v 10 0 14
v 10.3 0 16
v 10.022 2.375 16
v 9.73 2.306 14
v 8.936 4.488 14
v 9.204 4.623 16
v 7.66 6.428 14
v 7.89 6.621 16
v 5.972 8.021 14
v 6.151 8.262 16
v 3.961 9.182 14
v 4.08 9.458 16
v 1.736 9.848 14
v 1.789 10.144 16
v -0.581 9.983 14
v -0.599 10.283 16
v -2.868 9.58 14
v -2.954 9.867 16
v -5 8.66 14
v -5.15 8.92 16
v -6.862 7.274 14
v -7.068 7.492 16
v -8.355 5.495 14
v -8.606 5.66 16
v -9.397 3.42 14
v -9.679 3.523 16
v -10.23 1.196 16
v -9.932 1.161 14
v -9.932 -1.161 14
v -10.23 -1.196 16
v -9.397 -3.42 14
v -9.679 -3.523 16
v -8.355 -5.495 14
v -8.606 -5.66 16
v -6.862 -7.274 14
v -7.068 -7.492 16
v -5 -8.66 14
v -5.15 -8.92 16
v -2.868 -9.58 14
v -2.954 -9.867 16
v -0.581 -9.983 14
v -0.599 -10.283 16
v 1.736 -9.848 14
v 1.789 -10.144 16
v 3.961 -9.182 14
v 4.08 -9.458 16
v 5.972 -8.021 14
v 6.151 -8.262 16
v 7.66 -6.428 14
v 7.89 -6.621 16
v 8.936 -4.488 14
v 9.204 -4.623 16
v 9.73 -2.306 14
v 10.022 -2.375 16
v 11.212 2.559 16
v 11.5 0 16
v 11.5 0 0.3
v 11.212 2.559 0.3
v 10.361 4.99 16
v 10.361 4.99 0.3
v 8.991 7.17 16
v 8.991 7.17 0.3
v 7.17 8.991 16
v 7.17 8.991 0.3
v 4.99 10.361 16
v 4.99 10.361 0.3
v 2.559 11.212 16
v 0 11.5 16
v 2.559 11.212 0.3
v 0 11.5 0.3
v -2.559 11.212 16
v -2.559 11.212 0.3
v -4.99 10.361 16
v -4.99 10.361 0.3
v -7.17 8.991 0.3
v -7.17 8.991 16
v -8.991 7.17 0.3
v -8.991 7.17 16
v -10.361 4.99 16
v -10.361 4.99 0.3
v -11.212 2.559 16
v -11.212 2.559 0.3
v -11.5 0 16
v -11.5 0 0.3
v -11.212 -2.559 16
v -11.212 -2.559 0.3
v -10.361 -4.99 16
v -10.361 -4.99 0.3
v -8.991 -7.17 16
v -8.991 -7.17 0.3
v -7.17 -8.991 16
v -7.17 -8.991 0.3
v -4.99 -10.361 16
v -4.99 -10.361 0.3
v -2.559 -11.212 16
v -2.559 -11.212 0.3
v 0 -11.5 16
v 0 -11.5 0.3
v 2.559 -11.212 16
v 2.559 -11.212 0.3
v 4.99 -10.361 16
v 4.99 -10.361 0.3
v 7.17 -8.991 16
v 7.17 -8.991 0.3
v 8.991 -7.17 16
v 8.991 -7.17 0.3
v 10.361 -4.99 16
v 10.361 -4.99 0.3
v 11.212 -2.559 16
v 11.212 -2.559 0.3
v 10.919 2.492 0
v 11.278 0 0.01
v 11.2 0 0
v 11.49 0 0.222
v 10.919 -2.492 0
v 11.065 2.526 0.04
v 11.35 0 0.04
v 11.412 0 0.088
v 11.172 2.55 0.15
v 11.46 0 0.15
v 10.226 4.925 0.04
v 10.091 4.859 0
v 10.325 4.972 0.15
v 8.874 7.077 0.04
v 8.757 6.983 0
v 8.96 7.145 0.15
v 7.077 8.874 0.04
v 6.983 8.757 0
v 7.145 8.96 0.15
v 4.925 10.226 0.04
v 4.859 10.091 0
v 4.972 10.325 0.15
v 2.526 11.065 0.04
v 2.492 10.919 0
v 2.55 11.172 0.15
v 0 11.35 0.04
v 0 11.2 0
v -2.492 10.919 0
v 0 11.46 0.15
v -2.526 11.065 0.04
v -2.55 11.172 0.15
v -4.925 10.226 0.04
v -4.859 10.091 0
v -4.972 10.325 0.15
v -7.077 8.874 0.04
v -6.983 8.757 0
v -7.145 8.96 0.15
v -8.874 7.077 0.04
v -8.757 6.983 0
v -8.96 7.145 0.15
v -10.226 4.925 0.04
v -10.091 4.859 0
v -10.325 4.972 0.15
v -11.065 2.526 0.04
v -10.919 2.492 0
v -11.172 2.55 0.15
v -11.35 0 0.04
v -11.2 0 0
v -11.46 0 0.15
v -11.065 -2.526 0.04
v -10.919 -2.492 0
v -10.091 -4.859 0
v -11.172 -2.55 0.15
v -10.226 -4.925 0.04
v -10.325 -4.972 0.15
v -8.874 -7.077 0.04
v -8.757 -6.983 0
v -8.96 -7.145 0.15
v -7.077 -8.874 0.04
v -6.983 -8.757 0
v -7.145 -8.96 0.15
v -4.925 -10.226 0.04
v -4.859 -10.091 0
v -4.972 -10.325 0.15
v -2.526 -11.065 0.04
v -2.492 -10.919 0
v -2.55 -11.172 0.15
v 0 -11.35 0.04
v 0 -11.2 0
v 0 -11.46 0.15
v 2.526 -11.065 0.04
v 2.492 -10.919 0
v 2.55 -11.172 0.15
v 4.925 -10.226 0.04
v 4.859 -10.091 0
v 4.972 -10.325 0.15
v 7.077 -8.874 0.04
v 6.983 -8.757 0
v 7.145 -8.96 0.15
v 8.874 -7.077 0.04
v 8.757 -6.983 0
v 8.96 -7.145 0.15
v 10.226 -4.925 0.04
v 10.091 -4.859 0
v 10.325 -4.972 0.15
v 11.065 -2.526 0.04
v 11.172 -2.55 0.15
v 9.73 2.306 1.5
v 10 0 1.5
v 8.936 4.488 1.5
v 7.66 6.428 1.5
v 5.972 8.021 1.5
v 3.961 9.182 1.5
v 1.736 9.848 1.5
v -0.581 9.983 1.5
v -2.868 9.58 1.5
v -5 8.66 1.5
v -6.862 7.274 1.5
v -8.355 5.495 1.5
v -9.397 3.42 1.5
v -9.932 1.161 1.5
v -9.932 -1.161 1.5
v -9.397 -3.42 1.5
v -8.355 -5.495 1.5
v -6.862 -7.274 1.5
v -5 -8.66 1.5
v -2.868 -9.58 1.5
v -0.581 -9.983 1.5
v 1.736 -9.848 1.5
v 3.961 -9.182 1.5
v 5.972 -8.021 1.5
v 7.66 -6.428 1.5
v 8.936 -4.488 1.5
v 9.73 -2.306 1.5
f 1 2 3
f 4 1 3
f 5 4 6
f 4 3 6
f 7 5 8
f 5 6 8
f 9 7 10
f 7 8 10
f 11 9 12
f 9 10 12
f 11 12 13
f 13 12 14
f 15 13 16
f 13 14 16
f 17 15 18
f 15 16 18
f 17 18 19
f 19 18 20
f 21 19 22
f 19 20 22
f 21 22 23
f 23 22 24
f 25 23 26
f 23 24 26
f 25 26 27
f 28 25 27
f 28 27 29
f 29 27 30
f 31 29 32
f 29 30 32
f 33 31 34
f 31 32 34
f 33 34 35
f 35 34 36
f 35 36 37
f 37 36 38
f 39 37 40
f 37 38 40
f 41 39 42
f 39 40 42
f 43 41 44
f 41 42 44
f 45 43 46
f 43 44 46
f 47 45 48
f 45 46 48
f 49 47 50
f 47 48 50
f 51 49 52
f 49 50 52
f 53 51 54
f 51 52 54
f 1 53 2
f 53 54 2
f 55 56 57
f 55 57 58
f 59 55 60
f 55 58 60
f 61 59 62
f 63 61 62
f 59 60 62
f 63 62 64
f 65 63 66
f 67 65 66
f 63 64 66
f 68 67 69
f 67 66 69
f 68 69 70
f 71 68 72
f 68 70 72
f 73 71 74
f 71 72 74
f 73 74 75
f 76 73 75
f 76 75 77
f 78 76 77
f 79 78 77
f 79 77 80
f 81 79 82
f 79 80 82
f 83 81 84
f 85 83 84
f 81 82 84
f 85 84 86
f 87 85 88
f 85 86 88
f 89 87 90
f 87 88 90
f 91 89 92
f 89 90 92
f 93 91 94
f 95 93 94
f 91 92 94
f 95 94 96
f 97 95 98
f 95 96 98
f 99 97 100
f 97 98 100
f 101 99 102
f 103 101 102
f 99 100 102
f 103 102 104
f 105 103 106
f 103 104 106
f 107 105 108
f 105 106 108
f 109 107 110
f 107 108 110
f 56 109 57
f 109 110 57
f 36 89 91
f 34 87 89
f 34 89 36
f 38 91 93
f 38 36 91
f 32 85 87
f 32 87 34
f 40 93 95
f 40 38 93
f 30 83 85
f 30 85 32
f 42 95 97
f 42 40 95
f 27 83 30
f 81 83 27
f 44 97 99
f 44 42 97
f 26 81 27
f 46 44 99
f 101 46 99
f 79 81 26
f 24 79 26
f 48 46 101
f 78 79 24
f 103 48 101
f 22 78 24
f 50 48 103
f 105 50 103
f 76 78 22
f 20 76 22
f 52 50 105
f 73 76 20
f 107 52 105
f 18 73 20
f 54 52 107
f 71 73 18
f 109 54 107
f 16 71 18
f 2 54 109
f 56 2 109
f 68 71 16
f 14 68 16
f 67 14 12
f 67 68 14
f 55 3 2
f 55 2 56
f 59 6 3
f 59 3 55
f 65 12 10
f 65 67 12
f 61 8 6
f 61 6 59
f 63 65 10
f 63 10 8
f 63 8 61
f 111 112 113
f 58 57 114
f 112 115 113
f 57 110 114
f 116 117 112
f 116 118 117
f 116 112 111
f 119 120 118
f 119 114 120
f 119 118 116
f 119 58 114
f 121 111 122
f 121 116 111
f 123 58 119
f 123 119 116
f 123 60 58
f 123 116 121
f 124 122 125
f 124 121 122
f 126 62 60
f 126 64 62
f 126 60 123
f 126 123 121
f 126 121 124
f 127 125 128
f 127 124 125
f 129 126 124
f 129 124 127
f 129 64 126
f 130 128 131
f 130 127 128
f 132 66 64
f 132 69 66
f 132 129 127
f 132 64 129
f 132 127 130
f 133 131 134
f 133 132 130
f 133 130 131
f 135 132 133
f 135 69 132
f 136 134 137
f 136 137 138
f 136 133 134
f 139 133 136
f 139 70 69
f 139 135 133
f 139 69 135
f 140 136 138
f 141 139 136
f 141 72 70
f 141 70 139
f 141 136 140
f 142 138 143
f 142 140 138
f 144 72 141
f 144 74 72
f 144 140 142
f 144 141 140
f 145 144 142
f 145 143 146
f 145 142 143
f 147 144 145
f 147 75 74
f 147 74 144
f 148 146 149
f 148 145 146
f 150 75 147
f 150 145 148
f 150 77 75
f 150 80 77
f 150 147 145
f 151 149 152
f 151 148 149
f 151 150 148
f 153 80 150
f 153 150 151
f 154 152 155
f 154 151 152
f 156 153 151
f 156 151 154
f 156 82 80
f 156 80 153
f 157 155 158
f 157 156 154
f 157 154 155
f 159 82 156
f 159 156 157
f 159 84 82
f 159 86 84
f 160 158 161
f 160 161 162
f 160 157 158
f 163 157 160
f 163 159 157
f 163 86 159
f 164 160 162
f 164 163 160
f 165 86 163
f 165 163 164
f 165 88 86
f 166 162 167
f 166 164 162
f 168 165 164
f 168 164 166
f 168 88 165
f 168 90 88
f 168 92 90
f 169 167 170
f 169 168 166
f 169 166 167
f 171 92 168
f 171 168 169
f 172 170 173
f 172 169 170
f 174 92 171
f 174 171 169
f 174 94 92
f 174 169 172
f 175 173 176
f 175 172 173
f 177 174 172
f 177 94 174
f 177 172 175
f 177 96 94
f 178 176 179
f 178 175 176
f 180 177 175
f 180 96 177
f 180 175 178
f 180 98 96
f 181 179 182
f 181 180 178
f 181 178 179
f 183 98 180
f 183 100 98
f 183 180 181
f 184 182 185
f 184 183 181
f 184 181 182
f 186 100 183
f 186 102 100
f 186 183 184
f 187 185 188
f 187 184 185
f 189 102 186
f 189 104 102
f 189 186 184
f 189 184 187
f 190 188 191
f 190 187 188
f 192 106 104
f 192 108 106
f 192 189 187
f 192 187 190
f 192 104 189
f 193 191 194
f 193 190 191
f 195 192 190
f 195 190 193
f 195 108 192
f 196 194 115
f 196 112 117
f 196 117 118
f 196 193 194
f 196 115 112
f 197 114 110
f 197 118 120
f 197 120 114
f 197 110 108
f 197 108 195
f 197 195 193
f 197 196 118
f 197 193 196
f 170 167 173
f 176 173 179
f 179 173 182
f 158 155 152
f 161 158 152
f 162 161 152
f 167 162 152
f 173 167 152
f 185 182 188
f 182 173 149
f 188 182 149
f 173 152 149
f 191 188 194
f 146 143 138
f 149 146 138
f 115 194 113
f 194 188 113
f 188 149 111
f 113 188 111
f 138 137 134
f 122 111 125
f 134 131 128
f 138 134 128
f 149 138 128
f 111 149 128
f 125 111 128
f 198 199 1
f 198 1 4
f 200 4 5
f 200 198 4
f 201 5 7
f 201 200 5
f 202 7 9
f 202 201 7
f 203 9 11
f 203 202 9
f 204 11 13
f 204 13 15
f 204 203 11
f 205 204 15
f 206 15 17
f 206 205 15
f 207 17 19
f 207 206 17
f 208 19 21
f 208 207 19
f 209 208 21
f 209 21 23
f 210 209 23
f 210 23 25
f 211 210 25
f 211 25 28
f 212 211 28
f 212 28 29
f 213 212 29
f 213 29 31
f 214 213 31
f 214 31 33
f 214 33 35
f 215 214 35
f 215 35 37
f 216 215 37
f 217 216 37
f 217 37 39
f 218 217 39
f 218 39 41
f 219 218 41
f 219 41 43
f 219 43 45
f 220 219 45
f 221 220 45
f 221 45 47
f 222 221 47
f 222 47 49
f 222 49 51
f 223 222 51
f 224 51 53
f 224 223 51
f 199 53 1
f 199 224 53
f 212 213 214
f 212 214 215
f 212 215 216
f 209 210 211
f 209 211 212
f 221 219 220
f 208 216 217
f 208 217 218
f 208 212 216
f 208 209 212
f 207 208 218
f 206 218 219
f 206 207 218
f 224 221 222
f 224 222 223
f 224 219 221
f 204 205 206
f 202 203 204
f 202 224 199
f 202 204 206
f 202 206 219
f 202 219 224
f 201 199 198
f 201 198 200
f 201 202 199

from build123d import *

# Parameters (mm, degrees)
F2_R     = 11.5
F2_R_2   = 10
F3_DEPTH = 16
F4_DEPTH = 1.5
F5_R     = 0.3
F6_SIZE2 = 0.3
F6_SIZE  = 2


with BuildPart() as f3:
    # F2 (on Top) → F3 (new body)
    with BuildSketch(Plane.XY):
        Circle(F2_R)
        Circle(F2_R_2, mode=Mode.SUBTRACT)
    extrude(amount=F3_DEPTH)

    # F2 (on Top) → F4 (join)
    with BuildSketch(Plane.XY):
        Circle(F2_R_2)
    extrude(amount=F4_DEPTH)

    # F5
    f5_edges = [f3.edges().sort_by_distance(p)[0] for p in [
        (-11.5, 0, 0),
    ]]
    fillet(f5_edges, radius=F5_R)

    # F6
    f6_edges = [f3.edges().sort_by_distance(p)[0] for p in [
        (-10, 0, 16),
    ]]
    f6_side = f3.faces().sort_by_distance((-10, 0, 8.75))[0]
    chamfer(f6_edges, length=F6_SIZE, length2=F6_SIZE2, reference=f6_side)


solid = f3.part
